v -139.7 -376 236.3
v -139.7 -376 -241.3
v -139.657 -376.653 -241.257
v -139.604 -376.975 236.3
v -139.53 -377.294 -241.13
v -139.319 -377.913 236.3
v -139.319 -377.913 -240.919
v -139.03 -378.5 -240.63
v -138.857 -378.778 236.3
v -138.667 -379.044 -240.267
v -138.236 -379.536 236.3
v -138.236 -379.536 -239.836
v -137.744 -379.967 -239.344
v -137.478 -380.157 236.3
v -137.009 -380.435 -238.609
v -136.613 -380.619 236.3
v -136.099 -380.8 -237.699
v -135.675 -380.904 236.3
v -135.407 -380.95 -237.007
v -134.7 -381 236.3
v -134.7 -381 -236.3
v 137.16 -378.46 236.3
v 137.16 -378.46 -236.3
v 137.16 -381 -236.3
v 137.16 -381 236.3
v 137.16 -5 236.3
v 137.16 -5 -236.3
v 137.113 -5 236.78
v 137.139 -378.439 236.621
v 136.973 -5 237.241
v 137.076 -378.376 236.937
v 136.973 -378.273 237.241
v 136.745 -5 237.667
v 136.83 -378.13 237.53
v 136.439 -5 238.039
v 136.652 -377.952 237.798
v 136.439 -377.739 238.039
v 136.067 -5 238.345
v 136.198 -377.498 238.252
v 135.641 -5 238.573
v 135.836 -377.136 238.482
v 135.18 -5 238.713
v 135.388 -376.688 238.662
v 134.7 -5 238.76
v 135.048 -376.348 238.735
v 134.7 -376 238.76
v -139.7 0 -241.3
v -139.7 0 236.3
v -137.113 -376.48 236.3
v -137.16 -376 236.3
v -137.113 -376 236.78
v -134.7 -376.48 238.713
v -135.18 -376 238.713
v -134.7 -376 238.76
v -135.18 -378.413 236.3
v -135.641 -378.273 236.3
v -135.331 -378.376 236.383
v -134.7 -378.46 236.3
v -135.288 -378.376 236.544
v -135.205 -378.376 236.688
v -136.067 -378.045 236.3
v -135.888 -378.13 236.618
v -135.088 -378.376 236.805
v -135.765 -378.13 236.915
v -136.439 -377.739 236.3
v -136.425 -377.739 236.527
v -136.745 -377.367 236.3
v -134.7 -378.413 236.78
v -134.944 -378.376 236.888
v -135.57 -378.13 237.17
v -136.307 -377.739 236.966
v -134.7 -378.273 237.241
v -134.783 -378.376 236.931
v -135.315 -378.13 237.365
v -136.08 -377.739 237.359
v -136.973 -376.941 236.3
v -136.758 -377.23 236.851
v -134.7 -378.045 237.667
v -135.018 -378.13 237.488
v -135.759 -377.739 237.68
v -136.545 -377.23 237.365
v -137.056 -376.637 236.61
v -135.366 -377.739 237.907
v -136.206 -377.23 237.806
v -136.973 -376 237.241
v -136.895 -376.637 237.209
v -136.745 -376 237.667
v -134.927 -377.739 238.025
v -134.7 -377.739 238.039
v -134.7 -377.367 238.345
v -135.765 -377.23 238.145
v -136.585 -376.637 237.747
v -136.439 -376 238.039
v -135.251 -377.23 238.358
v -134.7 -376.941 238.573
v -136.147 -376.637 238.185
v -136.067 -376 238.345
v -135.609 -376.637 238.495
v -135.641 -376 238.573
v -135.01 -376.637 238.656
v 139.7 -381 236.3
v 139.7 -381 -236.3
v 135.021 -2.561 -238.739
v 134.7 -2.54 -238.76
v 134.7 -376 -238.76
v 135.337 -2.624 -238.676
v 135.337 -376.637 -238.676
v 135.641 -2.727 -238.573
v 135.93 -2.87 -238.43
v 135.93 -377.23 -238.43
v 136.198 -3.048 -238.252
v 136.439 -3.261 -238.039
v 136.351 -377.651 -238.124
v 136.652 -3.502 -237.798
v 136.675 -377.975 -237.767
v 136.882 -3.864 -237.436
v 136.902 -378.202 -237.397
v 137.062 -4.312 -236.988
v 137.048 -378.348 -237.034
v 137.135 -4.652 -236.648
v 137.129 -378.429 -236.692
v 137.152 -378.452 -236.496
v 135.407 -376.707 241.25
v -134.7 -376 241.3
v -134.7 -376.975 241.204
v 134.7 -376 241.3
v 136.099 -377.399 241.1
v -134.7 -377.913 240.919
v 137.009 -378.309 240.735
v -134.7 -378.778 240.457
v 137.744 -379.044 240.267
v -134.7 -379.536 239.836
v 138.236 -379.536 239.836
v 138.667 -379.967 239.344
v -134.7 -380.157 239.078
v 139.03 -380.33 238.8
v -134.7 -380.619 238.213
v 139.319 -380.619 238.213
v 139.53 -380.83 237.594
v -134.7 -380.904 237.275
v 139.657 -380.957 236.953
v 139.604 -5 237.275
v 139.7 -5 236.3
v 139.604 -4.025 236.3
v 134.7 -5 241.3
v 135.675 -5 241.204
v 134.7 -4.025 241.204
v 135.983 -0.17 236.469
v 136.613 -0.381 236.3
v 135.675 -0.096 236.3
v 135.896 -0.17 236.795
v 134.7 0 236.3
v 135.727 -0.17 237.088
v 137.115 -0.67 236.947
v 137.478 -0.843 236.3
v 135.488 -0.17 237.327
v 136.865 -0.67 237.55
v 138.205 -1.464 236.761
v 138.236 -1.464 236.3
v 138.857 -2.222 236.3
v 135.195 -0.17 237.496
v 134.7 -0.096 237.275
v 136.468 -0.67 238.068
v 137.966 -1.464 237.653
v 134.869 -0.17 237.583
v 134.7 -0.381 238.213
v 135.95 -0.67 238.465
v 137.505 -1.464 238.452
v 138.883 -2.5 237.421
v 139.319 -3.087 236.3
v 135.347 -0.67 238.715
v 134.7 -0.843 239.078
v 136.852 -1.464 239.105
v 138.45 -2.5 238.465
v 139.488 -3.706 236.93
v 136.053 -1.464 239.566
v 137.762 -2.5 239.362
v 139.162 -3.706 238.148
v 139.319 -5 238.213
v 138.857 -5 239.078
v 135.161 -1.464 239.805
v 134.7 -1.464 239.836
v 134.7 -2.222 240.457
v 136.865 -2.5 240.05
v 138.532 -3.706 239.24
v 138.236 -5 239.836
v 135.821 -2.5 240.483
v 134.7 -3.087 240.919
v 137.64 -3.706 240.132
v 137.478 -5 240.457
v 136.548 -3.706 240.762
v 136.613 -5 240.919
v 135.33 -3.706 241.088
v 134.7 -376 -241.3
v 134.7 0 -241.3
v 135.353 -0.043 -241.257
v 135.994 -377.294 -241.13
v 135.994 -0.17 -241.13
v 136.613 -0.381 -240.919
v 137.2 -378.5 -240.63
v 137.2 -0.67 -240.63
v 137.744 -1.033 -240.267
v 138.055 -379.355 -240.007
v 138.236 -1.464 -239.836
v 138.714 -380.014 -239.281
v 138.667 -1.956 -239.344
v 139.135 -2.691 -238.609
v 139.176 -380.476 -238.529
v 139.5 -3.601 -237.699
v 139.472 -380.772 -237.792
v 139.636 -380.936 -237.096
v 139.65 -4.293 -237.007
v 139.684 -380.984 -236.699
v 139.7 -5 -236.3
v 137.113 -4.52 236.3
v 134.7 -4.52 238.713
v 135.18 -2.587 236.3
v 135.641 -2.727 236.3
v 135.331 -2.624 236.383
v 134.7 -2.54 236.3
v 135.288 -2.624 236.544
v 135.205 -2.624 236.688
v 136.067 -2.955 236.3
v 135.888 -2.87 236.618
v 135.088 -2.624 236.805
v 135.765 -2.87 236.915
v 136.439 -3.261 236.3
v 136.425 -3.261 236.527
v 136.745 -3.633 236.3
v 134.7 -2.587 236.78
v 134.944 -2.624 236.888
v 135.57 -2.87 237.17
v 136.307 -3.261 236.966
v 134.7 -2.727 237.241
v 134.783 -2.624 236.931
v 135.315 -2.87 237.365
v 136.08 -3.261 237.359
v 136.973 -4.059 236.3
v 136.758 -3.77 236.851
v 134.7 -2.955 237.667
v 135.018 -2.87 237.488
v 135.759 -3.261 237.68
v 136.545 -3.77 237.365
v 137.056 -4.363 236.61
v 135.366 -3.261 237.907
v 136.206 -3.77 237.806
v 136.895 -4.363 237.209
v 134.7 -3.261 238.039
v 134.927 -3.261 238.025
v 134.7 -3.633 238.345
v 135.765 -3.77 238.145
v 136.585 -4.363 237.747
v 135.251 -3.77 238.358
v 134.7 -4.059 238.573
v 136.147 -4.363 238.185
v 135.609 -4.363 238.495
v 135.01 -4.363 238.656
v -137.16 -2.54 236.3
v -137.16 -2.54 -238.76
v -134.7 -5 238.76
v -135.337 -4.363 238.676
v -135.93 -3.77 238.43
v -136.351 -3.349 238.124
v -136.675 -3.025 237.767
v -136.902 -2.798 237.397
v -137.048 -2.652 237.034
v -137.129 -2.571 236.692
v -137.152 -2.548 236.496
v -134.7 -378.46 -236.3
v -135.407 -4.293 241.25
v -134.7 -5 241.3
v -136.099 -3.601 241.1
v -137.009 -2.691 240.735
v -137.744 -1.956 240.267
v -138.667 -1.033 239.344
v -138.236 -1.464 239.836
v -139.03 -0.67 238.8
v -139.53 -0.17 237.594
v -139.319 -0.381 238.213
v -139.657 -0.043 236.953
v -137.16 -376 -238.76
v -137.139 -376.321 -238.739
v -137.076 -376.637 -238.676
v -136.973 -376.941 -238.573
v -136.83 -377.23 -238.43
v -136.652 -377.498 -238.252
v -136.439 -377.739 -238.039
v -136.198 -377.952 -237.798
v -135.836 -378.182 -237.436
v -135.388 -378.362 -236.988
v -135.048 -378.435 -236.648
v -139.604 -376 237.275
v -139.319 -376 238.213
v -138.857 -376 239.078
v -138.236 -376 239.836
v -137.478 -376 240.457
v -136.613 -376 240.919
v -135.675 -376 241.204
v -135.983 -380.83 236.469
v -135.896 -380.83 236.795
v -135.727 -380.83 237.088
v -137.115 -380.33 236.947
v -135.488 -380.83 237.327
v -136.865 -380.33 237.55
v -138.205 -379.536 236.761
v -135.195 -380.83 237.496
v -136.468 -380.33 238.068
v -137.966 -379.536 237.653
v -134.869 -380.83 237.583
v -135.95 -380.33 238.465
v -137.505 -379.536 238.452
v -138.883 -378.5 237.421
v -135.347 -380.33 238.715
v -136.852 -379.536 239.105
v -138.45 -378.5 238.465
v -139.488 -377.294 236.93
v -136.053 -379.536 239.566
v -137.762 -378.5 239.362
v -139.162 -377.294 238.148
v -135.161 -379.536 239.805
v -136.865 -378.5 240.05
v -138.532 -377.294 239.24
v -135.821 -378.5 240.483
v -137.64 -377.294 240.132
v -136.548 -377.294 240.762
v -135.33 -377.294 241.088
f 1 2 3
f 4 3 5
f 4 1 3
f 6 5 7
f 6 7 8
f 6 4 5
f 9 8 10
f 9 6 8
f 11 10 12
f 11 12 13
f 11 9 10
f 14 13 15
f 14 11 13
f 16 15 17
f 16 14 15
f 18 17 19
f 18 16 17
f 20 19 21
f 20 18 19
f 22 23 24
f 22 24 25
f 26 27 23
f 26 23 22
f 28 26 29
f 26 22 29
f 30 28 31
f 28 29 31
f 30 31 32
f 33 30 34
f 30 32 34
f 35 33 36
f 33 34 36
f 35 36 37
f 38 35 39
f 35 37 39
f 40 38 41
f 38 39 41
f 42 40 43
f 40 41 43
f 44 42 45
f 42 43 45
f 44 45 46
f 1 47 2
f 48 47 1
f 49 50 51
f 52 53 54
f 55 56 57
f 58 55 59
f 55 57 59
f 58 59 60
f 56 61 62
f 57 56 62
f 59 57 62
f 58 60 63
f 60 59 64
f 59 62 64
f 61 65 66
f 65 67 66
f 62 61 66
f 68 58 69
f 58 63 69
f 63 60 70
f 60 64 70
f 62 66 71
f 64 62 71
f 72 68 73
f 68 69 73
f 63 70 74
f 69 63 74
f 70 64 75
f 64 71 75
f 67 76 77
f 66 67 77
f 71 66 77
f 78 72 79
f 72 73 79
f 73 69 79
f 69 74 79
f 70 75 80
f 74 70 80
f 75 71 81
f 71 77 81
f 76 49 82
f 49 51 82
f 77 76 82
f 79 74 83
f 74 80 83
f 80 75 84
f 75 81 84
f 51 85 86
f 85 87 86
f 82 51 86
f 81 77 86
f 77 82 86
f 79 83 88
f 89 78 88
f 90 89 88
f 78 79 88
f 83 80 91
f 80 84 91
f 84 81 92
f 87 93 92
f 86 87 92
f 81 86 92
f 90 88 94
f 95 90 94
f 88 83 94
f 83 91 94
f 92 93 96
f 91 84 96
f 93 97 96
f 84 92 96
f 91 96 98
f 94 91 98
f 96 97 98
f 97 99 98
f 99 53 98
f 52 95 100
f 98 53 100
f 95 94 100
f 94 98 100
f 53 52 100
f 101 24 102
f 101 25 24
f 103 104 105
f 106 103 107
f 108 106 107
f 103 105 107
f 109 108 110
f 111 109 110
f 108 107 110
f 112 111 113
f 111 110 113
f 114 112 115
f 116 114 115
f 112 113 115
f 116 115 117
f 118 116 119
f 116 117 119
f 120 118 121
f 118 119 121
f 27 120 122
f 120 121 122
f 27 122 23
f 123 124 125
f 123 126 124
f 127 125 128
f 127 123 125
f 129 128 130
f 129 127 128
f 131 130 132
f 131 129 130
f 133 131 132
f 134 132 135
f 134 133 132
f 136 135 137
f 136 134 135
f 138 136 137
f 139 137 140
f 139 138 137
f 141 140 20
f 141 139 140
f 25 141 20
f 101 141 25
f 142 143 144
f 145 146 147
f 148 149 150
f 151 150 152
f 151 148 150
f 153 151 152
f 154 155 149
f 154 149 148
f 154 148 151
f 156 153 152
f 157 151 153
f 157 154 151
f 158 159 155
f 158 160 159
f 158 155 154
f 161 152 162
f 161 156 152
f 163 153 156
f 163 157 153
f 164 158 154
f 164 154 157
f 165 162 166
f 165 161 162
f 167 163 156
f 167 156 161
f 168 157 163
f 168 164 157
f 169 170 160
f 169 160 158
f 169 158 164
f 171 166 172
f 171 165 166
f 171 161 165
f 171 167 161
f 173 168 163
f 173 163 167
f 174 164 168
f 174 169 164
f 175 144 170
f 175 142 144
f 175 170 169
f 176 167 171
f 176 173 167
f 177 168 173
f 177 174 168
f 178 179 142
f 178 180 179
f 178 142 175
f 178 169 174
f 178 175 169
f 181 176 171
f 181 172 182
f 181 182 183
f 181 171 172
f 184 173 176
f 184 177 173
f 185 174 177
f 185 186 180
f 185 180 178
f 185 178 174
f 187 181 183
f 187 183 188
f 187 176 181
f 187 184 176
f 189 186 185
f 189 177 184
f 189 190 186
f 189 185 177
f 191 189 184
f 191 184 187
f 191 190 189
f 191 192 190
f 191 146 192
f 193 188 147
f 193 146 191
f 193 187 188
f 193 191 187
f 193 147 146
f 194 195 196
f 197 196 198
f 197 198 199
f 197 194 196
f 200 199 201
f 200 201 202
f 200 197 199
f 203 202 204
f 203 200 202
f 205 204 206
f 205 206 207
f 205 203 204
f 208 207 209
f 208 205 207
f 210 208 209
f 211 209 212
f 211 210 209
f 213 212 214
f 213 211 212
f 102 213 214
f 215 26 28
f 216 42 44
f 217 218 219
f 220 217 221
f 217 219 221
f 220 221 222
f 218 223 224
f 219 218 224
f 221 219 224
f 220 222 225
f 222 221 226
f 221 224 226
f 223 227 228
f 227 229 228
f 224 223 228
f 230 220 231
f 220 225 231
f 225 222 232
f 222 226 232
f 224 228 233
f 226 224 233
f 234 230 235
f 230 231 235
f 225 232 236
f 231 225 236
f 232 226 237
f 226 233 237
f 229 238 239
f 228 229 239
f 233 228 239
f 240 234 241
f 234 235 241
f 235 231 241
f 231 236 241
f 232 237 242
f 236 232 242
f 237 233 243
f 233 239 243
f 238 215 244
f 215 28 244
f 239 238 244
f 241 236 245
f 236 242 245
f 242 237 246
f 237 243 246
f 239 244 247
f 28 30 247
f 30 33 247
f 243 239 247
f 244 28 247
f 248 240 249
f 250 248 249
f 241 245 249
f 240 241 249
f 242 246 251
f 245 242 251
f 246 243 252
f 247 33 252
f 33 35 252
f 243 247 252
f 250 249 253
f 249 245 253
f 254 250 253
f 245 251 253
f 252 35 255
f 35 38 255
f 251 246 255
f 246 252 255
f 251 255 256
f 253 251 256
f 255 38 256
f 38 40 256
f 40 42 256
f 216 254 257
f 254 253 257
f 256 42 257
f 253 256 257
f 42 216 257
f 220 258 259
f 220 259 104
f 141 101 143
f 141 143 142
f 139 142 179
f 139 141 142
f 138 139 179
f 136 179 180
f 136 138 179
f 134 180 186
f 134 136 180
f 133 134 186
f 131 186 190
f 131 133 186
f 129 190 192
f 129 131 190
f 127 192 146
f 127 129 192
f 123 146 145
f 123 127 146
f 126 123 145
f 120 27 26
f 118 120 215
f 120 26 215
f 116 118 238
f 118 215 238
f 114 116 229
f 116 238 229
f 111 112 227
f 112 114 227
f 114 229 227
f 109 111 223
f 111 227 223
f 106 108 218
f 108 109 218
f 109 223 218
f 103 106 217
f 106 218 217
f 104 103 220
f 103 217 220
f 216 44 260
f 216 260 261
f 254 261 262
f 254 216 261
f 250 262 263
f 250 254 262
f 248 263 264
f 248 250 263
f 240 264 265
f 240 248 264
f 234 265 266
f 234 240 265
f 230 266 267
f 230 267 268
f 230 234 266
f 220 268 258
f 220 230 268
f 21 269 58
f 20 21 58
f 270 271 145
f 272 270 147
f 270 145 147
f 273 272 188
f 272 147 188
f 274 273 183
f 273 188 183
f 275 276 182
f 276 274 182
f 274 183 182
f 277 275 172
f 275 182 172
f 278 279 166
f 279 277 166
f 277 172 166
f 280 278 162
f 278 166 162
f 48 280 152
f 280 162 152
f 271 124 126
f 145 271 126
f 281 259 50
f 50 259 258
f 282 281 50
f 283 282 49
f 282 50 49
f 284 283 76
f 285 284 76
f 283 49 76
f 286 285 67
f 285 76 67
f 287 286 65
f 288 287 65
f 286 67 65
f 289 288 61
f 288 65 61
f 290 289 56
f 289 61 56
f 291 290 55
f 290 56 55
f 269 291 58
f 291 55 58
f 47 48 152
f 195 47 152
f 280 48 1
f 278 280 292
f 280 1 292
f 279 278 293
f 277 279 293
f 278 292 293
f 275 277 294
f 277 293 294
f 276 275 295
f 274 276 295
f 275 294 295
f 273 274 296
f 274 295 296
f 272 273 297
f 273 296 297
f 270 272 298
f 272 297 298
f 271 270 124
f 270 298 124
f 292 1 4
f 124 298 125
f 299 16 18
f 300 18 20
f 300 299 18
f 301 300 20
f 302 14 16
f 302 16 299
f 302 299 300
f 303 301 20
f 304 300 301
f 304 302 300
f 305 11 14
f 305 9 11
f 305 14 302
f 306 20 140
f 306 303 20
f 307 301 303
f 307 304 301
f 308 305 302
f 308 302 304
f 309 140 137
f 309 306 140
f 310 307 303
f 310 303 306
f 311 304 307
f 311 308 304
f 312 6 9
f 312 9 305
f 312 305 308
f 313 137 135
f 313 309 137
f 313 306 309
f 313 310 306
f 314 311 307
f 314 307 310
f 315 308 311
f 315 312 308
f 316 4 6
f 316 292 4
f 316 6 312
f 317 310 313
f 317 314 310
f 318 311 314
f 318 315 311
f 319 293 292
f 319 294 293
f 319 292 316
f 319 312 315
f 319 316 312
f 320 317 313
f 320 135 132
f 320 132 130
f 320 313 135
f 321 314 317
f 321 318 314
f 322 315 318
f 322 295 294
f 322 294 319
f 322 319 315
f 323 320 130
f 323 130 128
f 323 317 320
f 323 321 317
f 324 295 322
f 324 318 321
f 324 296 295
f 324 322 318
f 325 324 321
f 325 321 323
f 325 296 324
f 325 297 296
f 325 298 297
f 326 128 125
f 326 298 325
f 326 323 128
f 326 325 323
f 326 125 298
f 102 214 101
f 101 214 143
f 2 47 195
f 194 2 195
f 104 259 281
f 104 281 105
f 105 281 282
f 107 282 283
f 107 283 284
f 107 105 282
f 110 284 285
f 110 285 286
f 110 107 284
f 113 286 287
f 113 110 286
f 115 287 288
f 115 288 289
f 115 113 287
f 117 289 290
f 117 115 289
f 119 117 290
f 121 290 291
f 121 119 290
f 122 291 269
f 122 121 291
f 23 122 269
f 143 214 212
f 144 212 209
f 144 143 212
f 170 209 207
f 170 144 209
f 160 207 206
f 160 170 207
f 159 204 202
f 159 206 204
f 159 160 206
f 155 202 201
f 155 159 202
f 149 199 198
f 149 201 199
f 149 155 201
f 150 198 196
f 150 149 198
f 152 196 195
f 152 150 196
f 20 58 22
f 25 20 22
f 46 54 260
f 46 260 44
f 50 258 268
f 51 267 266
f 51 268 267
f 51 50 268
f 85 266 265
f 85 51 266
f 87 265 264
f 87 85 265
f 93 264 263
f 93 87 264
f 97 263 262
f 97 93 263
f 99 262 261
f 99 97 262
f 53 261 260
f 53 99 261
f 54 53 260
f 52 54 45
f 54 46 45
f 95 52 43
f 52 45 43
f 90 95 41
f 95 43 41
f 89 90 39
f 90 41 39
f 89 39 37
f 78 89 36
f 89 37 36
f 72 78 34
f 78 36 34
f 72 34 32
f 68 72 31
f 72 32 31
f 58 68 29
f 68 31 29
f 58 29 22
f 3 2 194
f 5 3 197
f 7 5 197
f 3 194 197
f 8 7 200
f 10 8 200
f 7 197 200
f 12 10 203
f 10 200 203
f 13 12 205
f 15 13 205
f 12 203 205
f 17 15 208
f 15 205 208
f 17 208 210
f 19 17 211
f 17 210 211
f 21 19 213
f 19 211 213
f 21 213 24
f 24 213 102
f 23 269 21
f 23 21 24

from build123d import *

# Parameters (mm, degrees)
F0_W     = 279.4
F0_H     = 482.6
F1_DEPTH = 381
F2_R     = 5
F3_T     = -2.54


# Not quite as in the source:
# - a shell that OpenCascade refuses in one call is made with other operations: the cavity is built on its own and cut out


with BuildPart() as f1:
    # F0 (on Front) → F1 (new body)
    with BuildSketch(Plane.XZ):
        Rectangle(F0_W, F0_H)
    extrude(amount=F1_DEPTH)

    # F2
    f2_edges = [f1.edges().sort_by_distance(p)[0] for p in [
        (139.7, -190.5, 241.3),
        (-139.7, -190.5, 241.3),
        (139.7, -190.5, -241.3),
        (139.7, 0, 0),
        (0, 0, 241.3),
        (-139.7, -381, 0),
        (0, -381, -241.3),
        (0, -381, 241.3),
    ]]
    fillet(f2_edges, radius=F2_R)

    # F3: a shell. OpenCascade refuses it in one call, so the cavity is built on its own and cut out:
    # the body offset inwards by the wall thickness, plus a prism from it out through each open face.
    f3_core = offset(f1.part, amount=F3_T, mode=Mode.PRIVATE)
    f3_exits = [f3_core.faces().sort_by_distance(p)[0] for p in [
        (1.23, -378.46, 0),
    ]]
    add(f3_core, mode=Mode.SUBTRACT)
    extrude(f3_exits, amount=-F3_T, mode=Mode.SUBTRACT)


solid = f1.part
